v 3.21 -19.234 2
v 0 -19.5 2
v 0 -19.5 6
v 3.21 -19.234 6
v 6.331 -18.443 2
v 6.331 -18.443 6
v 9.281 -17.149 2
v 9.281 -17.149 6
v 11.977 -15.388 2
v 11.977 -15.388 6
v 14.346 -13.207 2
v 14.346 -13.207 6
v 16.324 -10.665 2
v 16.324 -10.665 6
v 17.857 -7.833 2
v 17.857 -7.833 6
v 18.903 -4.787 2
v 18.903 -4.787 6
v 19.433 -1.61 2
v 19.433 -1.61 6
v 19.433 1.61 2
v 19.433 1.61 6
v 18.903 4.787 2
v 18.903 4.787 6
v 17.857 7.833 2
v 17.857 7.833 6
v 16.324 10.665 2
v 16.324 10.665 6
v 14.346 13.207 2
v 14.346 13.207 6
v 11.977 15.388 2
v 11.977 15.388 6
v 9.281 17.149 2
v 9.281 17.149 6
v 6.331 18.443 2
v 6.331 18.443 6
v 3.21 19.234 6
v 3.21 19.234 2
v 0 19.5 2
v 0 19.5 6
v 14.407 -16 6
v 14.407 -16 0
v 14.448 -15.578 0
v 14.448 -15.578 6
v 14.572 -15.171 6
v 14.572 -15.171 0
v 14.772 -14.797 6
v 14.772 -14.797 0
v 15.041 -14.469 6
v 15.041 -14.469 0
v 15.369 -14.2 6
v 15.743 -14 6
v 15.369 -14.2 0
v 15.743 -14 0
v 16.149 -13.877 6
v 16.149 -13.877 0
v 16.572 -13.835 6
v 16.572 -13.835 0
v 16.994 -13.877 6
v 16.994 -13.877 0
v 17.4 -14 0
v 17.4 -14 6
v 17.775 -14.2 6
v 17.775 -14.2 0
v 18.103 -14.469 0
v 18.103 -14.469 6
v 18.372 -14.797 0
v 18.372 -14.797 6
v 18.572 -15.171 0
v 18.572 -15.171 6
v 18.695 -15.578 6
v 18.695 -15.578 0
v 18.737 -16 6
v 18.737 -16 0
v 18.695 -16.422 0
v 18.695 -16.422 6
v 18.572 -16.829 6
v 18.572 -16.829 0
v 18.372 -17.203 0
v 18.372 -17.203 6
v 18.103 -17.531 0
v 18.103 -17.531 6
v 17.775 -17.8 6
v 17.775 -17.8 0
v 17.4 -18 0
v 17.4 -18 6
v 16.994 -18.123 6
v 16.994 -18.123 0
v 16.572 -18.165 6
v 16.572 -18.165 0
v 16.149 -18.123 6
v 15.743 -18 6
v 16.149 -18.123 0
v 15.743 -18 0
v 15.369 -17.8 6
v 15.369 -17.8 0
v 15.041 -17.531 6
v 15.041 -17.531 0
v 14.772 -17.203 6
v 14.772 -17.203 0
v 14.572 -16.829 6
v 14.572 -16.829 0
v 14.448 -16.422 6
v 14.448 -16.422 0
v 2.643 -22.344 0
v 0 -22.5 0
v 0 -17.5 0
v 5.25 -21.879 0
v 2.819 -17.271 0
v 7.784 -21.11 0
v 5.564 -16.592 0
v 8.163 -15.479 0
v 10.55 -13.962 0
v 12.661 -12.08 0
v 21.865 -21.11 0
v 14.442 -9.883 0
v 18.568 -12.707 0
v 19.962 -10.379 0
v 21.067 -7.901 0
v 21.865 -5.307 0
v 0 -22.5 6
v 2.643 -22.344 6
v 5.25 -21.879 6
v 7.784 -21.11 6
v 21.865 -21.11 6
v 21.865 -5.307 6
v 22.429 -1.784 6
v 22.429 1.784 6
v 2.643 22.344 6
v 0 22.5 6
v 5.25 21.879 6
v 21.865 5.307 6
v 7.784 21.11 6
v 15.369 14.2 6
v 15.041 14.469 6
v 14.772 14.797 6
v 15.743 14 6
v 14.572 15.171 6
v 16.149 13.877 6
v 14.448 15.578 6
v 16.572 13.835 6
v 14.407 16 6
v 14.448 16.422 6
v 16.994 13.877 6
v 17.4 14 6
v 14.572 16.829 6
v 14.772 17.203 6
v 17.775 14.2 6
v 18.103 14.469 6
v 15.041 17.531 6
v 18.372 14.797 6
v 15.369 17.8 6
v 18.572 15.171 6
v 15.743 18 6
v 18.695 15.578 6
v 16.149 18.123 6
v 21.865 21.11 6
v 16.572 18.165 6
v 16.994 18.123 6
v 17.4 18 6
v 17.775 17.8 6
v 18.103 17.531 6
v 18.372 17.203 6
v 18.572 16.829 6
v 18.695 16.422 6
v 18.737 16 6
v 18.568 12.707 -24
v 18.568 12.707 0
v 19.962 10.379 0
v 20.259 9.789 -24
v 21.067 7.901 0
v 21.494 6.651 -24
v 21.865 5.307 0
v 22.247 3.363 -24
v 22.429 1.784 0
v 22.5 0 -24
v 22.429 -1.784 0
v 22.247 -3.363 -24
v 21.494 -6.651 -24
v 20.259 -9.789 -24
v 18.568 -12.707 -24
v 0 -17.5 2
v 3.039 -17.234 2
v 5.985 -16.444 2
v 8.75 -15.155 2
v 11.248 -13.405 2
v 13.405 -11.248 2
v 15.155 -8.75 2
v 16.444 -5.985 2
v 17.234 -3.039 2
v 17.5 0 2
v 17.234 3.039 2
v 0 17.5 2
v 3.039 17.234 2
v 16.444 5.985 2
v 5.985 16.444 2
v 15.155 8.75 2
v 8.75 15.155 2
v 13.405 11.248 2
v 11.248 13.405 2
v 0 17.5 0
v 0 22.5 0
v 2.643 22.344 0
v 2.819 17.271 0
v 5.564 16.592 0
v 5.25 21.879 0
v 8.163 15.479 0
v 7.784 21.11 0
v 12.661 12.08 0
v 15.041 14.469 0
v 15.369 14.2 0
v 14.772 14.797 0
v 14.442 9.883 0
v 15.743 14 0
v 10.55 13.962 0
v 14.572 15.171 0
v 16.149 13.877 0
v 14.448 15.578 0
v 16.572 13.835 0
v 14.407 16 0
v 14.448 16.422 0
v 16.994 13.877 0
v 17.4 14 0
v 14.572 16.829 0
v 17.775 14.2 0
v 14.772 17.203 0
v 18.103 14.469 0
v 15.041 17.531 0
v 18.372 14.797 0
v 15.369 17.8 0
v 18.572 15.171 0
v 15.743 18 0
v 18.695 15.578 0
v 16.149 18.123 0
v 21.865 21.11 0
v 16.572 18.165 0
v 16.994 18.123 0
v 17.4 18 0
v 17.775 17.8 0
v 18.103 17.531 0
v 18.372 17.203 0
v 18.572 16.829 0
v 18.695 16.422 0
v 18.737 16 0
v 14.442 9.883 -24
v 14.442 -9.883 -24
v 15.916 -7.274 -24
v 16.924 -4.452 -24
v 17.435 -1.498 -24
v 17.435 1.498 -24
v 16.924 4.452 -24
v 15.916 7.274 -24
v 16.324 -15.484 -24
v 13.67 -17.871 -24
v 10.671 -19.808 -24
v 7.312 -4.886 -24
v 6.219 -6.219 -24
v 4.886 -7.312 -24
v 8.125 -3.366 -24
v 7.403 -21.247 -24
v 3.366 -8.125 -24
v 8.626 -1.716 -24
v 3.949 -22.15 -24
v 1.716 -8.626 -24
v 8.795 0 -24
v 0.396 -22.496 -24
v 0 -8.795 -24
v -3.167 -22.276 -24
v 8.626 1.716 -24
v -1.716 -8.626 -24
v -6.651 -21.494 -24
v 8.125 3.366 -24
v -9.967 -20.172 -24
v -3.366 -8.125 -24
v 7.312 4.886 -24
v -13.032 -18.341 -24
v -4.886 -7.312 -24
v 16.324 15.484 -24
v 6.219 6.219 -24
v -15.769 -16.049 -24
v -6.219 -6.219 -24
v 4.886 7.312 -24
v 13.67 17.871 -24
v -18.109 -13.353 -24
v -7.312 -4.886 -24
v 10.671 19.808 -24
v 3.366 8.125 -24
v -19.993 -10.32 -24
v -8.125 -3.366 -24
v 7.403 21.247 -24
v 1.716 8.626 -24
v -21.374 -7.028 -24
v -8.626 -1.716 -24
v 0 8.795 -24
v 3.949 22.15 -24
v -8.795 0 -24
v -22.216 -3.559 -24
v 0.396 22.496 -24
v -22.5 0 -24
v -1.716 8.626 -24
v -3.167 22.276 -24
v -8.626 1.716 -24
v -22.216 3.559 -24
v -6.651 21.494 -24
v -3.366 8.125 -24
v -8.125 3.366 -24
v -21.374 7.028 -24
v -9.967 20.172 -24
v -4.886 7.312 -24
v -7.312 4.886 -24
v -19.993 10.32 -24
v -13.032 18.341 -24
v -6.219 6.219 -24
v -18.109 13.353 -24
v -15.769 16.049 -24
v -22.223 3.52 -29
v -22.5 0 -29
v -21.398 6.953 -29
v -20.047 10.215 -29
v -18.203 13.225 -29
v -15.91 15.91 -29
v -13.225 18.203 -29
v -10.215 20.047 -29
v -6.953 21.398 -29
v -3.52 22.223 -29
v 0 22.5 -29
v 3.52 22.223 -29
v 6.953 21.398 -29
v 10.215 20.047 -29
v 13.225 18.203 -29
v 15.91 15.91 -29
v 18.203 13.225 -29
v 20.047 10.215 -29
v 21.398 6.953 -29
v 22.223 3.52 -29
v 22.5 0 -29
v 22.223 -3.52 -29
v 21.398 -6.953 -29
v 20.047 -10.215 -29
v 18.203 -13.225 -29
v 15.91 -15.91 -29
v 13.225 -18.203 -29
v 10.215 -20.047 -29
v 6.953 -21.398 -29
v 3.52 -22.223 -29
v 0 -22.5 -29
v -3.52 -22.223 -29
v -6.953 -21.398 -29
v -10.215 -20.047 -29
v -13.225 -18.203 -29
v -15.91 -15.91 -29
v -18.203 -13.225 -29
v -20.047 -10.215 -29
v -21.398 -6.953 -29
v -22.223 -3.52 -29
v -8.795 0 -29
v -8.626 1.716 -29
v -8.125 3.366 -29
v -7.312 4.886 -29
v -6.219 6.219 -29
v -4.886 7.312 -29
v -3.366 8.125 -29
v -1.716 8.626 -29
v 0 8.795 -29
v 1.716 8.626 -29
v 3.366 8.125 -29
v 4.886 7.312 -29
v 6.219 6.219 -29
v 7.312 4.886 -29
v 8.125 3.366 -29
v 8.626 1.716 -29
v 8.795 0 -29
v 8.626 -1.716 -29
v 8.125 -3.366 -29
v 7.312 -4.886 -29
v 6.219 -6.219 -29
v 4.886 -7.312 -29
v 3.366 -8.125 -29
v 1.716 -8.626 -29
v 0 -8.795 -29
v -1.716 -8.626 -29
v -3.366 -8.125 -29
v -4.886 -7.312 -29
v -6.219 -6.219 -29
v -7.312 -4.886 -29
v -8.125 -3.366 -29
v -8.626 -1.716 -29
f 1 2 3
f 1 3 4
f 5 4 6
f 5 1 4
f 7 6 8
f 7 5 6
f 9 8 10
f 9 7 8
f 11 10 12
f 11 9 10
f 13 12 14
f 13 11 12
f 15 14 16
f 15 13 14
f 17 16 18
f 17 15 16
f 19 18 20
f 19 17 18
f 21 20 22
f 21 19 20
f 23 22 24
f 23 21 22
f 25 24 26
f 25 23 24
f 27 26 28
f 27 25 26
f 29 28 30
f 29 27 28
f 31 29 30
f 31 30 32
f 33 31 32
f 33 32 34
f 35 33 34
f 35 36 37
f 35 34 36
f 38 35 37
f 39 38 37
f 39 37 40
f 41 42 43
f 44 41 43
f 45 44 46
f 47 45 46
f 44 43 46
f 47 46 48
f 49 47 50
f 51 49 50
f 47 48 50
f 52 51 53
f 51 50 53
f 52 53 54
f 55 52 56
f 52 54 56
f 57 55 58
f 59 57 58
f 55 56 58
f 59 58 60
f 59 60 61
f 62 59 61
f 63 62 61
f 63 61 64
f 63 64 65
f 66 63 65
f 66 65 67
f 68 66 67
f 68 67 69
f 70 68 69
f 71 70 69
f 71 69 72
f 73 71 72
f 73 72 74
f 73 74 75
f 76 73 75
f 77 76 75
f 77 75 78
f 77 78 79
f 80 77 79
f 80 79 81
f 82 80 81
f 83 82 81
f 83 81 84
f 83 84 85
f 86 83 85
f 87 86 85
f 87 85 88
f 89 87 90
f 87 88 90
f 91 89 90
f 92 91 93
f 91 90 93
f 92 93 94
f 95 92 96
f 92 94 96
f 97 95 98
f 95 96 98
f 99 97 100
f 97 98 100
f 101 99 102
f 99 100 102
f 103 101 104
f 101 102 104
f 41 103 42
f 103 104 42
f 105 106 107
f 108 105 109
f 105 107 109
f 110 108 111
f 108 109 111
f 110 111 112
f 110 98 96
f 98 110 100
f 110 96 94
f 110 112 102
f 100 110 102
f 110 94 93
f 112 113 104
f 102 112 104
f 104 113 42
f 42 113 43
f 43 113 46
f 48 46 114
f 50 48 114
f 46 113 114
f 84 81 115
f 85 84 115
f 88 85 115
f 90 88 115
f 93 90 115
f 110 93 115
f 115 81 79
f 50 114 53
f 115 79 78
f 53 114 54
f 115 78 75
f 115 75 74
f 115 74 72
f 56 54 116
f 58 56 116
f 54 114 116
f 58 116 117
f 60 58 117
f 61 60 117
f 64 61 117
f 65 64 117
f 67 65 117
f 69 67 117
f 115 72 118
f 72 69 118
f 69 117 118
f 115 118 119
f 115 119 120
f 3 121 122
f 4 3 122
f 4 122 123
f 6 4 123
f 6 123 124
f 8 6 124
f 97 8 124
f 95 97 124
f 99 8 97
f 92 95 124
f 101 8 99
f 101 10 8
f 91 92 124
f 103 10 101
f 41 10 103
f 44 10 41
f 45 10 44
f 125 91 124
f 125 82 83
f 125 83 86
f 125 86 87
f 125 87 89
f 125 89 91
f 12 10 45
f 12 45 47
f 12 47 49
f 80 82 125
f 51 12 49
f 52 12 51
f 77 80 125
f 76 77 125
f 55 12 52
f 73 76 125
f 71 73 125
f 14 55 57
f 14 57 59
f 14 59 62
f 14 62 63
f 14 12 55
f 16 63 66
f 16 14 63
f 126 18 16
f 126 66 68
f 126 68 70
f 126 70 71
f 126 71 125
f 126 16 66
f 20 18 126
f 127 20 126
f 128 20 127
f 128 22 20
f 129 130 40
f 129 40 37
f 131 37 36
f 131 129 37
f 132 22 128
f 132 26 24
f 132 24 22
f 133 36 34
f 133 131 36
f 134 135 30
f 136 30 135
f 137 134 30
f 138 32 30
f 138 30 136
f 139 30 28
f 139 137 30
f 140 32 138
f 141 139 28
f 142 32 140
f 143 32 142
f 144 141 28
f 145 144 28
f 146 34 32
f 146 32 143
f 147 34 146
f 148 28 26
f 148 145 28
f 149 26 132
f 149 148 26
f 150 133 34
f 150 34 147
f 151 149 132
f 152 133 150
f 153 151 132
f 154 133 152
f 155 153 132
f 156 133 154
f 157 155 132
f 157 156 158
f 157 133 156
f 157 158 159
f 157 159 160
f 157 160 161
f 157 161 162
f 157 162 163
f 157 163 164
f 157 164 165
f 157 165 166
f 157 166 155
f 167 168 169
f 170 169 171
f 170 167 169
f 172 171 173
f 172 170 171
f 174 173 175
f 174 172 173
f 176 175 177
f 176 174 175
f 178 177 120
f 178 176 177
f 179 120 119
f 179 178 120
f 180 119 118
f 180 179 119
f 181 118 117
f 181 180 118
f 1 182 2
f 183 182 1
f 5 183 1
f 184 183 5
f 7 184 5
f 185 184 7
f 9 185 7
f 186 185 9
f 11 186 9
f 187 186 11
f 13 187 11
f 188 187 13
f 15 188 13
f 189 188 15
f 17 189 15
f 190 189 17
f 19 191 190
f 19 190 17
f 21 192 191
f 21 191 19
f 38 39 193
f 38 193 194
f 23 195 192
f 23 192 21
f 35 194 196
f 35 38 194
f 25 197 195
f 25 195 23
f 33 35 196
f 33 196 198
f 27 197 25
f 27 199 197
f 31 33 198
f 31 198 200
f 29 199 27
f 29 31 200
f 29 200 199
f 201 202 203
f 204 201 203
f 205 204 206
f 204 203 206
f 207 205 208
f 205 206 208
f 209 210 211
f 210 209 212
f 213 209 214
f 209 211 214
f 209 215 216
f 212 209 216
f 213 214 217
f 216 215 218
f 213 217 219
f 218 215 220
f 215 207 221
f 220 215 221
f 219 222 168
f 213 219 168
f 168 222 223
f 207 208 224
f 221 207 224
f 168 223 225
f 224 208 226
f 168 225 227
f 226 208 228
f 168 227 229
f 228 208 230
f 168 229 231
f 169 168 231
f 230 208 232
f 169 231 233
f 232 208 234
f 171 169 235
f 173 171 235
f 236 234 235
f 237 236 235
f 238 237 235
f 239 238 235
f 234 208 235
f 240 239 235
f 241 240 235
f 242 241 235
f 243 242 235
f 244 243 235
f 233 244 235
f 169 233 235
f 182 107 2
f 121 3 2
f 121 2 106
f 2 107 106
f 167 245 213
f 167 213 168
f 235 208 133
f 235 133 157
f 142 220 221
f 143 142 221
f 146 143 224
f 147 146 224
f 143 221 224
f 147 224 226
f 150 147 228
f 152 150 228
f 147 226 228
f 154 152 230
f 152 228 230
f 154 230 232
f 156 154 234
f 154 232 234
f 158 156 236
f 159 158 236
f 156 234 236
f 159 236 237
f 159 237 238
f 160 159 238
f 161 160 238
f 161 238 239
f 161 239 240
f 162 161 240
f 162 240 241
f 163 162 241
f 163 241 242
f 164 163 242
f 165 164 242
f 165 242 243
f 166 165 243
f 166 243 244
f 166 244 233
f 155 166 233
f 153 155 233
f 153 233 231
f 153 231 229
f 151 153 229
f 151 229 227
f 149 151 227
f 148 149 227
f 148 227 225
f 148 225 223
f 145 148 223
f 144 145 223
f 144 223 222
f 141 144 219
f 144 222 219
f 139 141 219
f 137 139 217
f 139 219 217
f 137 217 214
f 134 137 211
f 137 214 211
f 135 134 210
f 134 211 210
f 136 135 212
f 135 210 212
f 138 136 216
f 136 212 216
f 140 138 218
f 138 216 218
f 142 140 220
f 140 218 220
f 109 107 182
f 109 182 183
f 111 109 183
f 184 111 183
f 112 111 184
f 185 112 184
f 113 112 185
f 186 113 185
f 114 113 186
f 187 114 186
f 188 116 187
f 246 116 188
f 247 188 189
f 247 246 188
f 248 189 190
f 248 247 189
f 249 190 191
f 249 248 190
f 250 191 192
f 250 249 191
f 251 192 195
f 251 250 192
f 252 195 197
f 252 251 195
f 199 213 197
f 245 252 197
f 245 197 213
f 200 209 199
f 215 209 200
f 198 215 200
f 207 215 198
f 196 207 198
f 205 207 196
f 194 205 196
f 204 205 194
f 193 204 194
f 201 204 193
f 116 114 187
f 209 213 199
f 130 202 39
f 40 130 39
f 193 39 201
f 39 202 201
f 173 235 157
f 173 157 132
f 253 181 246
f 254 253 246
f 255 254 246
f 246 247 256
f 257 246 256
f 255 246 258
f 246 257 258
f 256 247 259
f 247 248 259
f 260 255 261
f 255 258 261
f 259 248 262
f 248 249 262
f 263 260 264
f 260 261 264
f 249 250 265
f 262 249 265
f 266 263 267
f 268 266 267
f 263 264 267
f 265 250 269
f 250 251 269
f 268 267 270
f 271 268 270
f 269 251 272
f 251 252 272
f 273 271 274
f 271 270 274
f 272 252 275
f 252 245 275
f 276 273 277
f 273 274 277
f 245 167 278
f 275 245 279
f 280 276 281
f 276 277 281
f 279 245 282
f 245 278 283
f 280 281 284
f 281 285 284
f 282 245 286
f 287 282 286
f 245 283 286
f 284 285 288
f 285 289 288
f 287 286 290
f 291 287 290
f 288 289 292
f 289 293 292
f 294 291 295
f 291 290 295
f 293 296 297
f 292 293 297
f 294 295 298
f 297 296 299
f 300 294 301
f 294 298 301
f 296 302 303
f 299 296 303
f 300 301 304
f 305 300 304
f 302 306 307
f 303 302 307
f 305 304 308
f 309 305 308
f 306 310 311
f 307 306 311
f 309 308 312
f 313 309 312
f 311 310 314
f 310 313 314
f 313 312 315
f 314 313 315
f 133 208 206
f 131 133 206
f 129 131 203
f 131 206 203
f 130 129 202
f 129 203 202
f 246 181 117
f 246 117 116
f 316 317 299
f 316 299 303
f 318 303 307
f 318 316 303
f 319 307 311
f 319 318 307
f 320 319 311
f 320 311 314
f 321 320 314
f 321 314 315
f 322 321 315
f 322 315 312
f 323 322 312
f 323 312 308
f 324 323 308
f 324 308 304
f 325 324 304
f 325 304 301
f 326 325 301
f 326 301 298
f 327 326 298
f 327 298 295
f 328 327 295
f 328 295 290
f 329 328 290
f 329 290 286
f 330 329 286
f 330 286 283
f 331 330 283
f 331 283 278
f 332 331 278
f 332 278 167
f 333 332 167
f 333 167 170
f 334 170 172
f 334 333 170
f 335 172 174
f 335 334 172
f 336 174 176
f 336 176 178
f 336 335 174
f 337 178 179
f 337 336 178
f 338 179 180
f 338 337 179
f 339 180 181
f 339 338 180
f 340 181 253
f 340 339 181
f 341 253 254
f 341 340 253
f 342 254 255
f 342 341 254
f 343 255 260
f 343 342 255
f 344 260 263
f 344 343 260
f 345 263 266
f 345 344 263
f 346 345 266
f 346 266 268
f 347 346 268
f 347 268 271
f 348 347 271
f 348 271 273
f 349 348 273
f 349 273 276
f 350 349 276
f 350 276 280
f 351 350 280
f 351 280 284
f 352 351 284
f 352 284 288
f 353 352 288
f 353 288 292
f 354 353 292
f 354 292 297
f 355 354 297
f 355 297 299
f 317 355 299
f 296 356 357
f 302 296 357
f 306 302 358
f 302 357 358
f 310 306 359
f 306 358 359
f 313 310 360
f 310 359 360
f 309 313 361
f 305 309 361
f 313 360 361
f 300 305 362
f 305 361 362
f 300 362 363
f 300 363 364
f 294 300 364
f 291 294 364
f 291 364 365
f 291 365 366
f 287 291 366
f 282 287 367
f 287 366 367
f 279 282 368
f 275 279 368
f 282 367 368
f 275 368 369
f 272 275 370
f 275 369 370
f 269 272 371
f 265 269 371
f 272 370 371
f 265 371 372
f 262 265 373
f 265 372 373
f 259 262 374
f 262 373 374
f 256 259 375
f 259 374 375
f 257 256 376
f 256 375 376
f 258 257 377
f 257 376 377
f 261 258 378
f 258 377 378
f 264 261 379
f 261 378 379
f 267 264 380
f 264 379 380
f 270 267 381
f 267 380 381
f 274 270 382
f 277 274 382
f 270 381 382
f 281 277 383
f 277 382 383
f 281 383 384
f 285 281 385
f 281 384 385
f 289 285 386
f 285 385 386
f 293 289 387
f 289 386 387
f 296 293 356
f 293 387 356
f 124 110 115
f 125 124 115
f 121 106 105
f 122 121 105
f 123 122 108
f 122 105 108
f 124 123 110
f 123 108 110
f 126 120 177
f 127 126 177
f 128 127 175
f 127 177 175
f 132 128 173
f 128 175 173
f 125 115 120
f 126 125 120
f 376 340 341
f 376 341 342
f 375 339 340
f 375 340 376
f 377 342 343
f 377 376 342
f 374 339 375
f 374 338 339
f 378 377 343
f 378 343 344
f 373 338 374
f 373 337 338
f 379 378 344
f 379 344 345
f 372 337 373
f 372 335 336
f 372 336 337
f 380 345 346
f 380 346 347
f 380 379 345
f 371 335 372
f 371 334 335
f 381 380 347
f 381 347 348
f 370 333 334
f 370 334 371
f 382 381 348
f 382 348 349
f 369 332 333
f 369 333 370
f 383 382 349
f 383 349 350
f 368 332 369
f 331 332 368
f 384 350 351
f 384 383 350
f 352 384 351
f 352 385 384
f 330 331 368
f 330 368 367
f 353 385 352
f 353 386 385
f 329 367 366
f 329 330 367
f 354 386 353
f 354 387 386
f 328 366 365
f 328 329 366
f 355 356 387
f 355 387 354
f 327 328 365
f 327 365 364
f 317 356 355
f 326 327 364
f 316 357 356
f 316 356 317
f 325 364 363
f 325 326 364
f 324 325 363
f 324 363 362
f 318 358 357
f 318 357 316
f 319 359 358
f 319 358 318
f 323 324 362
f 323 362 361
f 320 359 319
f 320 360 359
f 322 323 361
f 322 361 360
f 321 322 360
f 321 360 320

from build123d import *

# Parameters (mm, degrees)
SKETCH1_R           = 22.4995417
SKETCH1_R_2         = 17.4995417
BOSS_EXTRUDE1_DEPTH = 6
CUT_EXTRUDE1_START  = -4
SKETCH2_R           = 19.4995417
SKETCH2_R_2         = 17.4995417
CUT_EXTRUDE1_DEPTH  = 4
BOSS_EXTRUDE2_DEPTH = 6
BOSS_EXTRUDE3_START = 24
BOSS_EXTRUDE3_DEPTH = 24
BOSS_EXTRUDE4_START = 5
SKETCH6_R           = 22.4995417
SKETCH6_R_2         = 8.79453705
BOSS_EXTRUDE4_DEPTH = 5
CUT_EXTRUDE2_DEPTH  = 44.051814752
SKETCH9_R           = 2.165
CUT_EXTRUDE4_DEPTH  = 44.051814752


with BuildPart() as part:
    # Sketch1 → Boss-Extrude1 (new body)
    with BuildSketch(Plane.XY):
        Circle(SKETCH1_R)
        Circle(SKETCH1_R_2, mode=Mode.SUBTRACT)
    extrude(amount=BOSS_EXTRUDE1_DEPTH)

    # Sketch2 → Cut-Extrude1 (cut)
    with BuildSketch(Plane.XY.offset(6).offset(CUT_EXTRUDE1_START)):
        Circle(SKETCH2_R)
        Circle(SKETCH2_R_2, mode=Mode.SUBTRACT)
    extrude(amount=CUT_EXTRUDE1_DEPTH, mode=Mode.SUBTRACT)

    # Sketch3 → Boss-Extrude2 (add, through all)
    with BuildSketch(Plane(origin=(0, 0, 0), x_dir=(-1, 0, 0), z_dir=(0, 0, -1))):
        with BuildLine():
            Line((-7.783576547, 21.11031295), (-21.864631522, 21.11031295))
            Line((-21.864631522, 21.11031295), (-21.864631522, 5.307284156))
            ThreePointArc((-21.864631522, 5.307284156), (-16.798452018, 14.96801211), (-7.783576547, 21.11031295))
        make_face()
        with BuildLine():
            Line((21.864631522, -21.11031295), (7.783576547, -21.11031295))
            ThreePointArc((7.783576547, -21.11031295), (16.798452018, -14.96801211), (21.864631522, -5.307284156))
            Line((21.864631522, -5.307284156), (21.864631522, -21.11031295))
        make_face()
        with BuildLine():
            Line((21.864631522, 21.11031295), (7.783576547, 21.11031295))
            ThreePointArc((7.783576547, 21.11031295), (16.798452018, 14.96801211), (21.864631522, 5.307284156))
            Line((21.864631522, 5.307284156), (21.864631522, 21.11031295))
        make_face()
        with BuildLine():
            Line((-21.864631522, -21.11031295), (-21.864631522, -5.307284156))
            ThreePointArc((-21.864631522, -5.307284156), (-16.798452018, -14.96801211), (-7.783576547, -21.11031295))
            Line((-7.783576547, -21.11031295), (-21.864631522, -21.11031295))
        make_face()
    extrude(amount=-BOSS_EXTRUDE2_DEPTH)

    # Sketch5 → Boss-Extrude3 (add)
    with BuildSketch(Plane(origin=(0, 0, 0), x_dir=(-1, 0, 0), z_dir=(0, 0, -1)).offset(BOSS_EXTRUDE3_START)):
        with BuildLine():
            Line((-14.441527519, 9.883129191), (-18.5677863, 12.706954341))
            ThreePointArc((-18.5677863, 12.706954341), (-22.4995417, 0), (-18.5677863, -12.706954341))
            Line((-18.5677863, -12.706954341), (-14.441527519, -9.883129191))
            ThreePointArc((-14.441527519, -9.883129191), (-17.4995417, 0), (-14.441527519, 9.883129191))
        make_face()
    extrude(amount=-BOSS_EXTRUDE3_DEPTH)

    # Sketch6 → Boss-Extrude4 (add)
    with BuildSketch(Plane(origin=(0, 0, -24), x_dir=(-1, 0, 0), z_dir=(0, 0, -1)).offset(BOSS_EXTRUDE4_START)):
        Circle(SKETCH6_R)
        Circle(SKETCH6_R_2, mode=Mode.SUBTRACT)
    extrude(amount=-BOSS_EXTRUDE4_DEPTH)

    # Sketch7 → Cut-Extrude2 (cut, through all)
    with BuildSketch(Plane(origin=(0, 0, 0), x_dir=(-1, 0, 0), z_dir=(0, 0, -1))):
        Polygon((0, 20.425006128), (0, -31.813494394), (36.314088068, -29.010206824), (38.071070197, 28.399979516), (-0.660202218, 29.585311907), (0, 25.789149152), align=None)
    extrude(amount=-CUT_EXTRUDE2_DEPTH, mode=Mode.SUBTRACT)

    # Sketch9 → Cut-Extrude4 (cut, through all)
    with BuildSketch(Plane(origin=(0, 0, 0), x_dir=(-1, 0, 0), z_dir=(0, 0, -1))):
        with Locations((16.571715691, 16)):
            Circle(SKETCH9_R)
        with Locations((16.571715691, -16)):
            Circle(SKETCH9_R)
        with Locations((-16.571715691, -16)):
            Circle(SKETCH9_R)
        with Locations((-16.571715691, 16)):
            Circle(SKETCH9_R)
    extrude(amount=-CUT_EXTRUDE4_DEPTH, mode=Mode.SUBTRACT)


solid = part.part
